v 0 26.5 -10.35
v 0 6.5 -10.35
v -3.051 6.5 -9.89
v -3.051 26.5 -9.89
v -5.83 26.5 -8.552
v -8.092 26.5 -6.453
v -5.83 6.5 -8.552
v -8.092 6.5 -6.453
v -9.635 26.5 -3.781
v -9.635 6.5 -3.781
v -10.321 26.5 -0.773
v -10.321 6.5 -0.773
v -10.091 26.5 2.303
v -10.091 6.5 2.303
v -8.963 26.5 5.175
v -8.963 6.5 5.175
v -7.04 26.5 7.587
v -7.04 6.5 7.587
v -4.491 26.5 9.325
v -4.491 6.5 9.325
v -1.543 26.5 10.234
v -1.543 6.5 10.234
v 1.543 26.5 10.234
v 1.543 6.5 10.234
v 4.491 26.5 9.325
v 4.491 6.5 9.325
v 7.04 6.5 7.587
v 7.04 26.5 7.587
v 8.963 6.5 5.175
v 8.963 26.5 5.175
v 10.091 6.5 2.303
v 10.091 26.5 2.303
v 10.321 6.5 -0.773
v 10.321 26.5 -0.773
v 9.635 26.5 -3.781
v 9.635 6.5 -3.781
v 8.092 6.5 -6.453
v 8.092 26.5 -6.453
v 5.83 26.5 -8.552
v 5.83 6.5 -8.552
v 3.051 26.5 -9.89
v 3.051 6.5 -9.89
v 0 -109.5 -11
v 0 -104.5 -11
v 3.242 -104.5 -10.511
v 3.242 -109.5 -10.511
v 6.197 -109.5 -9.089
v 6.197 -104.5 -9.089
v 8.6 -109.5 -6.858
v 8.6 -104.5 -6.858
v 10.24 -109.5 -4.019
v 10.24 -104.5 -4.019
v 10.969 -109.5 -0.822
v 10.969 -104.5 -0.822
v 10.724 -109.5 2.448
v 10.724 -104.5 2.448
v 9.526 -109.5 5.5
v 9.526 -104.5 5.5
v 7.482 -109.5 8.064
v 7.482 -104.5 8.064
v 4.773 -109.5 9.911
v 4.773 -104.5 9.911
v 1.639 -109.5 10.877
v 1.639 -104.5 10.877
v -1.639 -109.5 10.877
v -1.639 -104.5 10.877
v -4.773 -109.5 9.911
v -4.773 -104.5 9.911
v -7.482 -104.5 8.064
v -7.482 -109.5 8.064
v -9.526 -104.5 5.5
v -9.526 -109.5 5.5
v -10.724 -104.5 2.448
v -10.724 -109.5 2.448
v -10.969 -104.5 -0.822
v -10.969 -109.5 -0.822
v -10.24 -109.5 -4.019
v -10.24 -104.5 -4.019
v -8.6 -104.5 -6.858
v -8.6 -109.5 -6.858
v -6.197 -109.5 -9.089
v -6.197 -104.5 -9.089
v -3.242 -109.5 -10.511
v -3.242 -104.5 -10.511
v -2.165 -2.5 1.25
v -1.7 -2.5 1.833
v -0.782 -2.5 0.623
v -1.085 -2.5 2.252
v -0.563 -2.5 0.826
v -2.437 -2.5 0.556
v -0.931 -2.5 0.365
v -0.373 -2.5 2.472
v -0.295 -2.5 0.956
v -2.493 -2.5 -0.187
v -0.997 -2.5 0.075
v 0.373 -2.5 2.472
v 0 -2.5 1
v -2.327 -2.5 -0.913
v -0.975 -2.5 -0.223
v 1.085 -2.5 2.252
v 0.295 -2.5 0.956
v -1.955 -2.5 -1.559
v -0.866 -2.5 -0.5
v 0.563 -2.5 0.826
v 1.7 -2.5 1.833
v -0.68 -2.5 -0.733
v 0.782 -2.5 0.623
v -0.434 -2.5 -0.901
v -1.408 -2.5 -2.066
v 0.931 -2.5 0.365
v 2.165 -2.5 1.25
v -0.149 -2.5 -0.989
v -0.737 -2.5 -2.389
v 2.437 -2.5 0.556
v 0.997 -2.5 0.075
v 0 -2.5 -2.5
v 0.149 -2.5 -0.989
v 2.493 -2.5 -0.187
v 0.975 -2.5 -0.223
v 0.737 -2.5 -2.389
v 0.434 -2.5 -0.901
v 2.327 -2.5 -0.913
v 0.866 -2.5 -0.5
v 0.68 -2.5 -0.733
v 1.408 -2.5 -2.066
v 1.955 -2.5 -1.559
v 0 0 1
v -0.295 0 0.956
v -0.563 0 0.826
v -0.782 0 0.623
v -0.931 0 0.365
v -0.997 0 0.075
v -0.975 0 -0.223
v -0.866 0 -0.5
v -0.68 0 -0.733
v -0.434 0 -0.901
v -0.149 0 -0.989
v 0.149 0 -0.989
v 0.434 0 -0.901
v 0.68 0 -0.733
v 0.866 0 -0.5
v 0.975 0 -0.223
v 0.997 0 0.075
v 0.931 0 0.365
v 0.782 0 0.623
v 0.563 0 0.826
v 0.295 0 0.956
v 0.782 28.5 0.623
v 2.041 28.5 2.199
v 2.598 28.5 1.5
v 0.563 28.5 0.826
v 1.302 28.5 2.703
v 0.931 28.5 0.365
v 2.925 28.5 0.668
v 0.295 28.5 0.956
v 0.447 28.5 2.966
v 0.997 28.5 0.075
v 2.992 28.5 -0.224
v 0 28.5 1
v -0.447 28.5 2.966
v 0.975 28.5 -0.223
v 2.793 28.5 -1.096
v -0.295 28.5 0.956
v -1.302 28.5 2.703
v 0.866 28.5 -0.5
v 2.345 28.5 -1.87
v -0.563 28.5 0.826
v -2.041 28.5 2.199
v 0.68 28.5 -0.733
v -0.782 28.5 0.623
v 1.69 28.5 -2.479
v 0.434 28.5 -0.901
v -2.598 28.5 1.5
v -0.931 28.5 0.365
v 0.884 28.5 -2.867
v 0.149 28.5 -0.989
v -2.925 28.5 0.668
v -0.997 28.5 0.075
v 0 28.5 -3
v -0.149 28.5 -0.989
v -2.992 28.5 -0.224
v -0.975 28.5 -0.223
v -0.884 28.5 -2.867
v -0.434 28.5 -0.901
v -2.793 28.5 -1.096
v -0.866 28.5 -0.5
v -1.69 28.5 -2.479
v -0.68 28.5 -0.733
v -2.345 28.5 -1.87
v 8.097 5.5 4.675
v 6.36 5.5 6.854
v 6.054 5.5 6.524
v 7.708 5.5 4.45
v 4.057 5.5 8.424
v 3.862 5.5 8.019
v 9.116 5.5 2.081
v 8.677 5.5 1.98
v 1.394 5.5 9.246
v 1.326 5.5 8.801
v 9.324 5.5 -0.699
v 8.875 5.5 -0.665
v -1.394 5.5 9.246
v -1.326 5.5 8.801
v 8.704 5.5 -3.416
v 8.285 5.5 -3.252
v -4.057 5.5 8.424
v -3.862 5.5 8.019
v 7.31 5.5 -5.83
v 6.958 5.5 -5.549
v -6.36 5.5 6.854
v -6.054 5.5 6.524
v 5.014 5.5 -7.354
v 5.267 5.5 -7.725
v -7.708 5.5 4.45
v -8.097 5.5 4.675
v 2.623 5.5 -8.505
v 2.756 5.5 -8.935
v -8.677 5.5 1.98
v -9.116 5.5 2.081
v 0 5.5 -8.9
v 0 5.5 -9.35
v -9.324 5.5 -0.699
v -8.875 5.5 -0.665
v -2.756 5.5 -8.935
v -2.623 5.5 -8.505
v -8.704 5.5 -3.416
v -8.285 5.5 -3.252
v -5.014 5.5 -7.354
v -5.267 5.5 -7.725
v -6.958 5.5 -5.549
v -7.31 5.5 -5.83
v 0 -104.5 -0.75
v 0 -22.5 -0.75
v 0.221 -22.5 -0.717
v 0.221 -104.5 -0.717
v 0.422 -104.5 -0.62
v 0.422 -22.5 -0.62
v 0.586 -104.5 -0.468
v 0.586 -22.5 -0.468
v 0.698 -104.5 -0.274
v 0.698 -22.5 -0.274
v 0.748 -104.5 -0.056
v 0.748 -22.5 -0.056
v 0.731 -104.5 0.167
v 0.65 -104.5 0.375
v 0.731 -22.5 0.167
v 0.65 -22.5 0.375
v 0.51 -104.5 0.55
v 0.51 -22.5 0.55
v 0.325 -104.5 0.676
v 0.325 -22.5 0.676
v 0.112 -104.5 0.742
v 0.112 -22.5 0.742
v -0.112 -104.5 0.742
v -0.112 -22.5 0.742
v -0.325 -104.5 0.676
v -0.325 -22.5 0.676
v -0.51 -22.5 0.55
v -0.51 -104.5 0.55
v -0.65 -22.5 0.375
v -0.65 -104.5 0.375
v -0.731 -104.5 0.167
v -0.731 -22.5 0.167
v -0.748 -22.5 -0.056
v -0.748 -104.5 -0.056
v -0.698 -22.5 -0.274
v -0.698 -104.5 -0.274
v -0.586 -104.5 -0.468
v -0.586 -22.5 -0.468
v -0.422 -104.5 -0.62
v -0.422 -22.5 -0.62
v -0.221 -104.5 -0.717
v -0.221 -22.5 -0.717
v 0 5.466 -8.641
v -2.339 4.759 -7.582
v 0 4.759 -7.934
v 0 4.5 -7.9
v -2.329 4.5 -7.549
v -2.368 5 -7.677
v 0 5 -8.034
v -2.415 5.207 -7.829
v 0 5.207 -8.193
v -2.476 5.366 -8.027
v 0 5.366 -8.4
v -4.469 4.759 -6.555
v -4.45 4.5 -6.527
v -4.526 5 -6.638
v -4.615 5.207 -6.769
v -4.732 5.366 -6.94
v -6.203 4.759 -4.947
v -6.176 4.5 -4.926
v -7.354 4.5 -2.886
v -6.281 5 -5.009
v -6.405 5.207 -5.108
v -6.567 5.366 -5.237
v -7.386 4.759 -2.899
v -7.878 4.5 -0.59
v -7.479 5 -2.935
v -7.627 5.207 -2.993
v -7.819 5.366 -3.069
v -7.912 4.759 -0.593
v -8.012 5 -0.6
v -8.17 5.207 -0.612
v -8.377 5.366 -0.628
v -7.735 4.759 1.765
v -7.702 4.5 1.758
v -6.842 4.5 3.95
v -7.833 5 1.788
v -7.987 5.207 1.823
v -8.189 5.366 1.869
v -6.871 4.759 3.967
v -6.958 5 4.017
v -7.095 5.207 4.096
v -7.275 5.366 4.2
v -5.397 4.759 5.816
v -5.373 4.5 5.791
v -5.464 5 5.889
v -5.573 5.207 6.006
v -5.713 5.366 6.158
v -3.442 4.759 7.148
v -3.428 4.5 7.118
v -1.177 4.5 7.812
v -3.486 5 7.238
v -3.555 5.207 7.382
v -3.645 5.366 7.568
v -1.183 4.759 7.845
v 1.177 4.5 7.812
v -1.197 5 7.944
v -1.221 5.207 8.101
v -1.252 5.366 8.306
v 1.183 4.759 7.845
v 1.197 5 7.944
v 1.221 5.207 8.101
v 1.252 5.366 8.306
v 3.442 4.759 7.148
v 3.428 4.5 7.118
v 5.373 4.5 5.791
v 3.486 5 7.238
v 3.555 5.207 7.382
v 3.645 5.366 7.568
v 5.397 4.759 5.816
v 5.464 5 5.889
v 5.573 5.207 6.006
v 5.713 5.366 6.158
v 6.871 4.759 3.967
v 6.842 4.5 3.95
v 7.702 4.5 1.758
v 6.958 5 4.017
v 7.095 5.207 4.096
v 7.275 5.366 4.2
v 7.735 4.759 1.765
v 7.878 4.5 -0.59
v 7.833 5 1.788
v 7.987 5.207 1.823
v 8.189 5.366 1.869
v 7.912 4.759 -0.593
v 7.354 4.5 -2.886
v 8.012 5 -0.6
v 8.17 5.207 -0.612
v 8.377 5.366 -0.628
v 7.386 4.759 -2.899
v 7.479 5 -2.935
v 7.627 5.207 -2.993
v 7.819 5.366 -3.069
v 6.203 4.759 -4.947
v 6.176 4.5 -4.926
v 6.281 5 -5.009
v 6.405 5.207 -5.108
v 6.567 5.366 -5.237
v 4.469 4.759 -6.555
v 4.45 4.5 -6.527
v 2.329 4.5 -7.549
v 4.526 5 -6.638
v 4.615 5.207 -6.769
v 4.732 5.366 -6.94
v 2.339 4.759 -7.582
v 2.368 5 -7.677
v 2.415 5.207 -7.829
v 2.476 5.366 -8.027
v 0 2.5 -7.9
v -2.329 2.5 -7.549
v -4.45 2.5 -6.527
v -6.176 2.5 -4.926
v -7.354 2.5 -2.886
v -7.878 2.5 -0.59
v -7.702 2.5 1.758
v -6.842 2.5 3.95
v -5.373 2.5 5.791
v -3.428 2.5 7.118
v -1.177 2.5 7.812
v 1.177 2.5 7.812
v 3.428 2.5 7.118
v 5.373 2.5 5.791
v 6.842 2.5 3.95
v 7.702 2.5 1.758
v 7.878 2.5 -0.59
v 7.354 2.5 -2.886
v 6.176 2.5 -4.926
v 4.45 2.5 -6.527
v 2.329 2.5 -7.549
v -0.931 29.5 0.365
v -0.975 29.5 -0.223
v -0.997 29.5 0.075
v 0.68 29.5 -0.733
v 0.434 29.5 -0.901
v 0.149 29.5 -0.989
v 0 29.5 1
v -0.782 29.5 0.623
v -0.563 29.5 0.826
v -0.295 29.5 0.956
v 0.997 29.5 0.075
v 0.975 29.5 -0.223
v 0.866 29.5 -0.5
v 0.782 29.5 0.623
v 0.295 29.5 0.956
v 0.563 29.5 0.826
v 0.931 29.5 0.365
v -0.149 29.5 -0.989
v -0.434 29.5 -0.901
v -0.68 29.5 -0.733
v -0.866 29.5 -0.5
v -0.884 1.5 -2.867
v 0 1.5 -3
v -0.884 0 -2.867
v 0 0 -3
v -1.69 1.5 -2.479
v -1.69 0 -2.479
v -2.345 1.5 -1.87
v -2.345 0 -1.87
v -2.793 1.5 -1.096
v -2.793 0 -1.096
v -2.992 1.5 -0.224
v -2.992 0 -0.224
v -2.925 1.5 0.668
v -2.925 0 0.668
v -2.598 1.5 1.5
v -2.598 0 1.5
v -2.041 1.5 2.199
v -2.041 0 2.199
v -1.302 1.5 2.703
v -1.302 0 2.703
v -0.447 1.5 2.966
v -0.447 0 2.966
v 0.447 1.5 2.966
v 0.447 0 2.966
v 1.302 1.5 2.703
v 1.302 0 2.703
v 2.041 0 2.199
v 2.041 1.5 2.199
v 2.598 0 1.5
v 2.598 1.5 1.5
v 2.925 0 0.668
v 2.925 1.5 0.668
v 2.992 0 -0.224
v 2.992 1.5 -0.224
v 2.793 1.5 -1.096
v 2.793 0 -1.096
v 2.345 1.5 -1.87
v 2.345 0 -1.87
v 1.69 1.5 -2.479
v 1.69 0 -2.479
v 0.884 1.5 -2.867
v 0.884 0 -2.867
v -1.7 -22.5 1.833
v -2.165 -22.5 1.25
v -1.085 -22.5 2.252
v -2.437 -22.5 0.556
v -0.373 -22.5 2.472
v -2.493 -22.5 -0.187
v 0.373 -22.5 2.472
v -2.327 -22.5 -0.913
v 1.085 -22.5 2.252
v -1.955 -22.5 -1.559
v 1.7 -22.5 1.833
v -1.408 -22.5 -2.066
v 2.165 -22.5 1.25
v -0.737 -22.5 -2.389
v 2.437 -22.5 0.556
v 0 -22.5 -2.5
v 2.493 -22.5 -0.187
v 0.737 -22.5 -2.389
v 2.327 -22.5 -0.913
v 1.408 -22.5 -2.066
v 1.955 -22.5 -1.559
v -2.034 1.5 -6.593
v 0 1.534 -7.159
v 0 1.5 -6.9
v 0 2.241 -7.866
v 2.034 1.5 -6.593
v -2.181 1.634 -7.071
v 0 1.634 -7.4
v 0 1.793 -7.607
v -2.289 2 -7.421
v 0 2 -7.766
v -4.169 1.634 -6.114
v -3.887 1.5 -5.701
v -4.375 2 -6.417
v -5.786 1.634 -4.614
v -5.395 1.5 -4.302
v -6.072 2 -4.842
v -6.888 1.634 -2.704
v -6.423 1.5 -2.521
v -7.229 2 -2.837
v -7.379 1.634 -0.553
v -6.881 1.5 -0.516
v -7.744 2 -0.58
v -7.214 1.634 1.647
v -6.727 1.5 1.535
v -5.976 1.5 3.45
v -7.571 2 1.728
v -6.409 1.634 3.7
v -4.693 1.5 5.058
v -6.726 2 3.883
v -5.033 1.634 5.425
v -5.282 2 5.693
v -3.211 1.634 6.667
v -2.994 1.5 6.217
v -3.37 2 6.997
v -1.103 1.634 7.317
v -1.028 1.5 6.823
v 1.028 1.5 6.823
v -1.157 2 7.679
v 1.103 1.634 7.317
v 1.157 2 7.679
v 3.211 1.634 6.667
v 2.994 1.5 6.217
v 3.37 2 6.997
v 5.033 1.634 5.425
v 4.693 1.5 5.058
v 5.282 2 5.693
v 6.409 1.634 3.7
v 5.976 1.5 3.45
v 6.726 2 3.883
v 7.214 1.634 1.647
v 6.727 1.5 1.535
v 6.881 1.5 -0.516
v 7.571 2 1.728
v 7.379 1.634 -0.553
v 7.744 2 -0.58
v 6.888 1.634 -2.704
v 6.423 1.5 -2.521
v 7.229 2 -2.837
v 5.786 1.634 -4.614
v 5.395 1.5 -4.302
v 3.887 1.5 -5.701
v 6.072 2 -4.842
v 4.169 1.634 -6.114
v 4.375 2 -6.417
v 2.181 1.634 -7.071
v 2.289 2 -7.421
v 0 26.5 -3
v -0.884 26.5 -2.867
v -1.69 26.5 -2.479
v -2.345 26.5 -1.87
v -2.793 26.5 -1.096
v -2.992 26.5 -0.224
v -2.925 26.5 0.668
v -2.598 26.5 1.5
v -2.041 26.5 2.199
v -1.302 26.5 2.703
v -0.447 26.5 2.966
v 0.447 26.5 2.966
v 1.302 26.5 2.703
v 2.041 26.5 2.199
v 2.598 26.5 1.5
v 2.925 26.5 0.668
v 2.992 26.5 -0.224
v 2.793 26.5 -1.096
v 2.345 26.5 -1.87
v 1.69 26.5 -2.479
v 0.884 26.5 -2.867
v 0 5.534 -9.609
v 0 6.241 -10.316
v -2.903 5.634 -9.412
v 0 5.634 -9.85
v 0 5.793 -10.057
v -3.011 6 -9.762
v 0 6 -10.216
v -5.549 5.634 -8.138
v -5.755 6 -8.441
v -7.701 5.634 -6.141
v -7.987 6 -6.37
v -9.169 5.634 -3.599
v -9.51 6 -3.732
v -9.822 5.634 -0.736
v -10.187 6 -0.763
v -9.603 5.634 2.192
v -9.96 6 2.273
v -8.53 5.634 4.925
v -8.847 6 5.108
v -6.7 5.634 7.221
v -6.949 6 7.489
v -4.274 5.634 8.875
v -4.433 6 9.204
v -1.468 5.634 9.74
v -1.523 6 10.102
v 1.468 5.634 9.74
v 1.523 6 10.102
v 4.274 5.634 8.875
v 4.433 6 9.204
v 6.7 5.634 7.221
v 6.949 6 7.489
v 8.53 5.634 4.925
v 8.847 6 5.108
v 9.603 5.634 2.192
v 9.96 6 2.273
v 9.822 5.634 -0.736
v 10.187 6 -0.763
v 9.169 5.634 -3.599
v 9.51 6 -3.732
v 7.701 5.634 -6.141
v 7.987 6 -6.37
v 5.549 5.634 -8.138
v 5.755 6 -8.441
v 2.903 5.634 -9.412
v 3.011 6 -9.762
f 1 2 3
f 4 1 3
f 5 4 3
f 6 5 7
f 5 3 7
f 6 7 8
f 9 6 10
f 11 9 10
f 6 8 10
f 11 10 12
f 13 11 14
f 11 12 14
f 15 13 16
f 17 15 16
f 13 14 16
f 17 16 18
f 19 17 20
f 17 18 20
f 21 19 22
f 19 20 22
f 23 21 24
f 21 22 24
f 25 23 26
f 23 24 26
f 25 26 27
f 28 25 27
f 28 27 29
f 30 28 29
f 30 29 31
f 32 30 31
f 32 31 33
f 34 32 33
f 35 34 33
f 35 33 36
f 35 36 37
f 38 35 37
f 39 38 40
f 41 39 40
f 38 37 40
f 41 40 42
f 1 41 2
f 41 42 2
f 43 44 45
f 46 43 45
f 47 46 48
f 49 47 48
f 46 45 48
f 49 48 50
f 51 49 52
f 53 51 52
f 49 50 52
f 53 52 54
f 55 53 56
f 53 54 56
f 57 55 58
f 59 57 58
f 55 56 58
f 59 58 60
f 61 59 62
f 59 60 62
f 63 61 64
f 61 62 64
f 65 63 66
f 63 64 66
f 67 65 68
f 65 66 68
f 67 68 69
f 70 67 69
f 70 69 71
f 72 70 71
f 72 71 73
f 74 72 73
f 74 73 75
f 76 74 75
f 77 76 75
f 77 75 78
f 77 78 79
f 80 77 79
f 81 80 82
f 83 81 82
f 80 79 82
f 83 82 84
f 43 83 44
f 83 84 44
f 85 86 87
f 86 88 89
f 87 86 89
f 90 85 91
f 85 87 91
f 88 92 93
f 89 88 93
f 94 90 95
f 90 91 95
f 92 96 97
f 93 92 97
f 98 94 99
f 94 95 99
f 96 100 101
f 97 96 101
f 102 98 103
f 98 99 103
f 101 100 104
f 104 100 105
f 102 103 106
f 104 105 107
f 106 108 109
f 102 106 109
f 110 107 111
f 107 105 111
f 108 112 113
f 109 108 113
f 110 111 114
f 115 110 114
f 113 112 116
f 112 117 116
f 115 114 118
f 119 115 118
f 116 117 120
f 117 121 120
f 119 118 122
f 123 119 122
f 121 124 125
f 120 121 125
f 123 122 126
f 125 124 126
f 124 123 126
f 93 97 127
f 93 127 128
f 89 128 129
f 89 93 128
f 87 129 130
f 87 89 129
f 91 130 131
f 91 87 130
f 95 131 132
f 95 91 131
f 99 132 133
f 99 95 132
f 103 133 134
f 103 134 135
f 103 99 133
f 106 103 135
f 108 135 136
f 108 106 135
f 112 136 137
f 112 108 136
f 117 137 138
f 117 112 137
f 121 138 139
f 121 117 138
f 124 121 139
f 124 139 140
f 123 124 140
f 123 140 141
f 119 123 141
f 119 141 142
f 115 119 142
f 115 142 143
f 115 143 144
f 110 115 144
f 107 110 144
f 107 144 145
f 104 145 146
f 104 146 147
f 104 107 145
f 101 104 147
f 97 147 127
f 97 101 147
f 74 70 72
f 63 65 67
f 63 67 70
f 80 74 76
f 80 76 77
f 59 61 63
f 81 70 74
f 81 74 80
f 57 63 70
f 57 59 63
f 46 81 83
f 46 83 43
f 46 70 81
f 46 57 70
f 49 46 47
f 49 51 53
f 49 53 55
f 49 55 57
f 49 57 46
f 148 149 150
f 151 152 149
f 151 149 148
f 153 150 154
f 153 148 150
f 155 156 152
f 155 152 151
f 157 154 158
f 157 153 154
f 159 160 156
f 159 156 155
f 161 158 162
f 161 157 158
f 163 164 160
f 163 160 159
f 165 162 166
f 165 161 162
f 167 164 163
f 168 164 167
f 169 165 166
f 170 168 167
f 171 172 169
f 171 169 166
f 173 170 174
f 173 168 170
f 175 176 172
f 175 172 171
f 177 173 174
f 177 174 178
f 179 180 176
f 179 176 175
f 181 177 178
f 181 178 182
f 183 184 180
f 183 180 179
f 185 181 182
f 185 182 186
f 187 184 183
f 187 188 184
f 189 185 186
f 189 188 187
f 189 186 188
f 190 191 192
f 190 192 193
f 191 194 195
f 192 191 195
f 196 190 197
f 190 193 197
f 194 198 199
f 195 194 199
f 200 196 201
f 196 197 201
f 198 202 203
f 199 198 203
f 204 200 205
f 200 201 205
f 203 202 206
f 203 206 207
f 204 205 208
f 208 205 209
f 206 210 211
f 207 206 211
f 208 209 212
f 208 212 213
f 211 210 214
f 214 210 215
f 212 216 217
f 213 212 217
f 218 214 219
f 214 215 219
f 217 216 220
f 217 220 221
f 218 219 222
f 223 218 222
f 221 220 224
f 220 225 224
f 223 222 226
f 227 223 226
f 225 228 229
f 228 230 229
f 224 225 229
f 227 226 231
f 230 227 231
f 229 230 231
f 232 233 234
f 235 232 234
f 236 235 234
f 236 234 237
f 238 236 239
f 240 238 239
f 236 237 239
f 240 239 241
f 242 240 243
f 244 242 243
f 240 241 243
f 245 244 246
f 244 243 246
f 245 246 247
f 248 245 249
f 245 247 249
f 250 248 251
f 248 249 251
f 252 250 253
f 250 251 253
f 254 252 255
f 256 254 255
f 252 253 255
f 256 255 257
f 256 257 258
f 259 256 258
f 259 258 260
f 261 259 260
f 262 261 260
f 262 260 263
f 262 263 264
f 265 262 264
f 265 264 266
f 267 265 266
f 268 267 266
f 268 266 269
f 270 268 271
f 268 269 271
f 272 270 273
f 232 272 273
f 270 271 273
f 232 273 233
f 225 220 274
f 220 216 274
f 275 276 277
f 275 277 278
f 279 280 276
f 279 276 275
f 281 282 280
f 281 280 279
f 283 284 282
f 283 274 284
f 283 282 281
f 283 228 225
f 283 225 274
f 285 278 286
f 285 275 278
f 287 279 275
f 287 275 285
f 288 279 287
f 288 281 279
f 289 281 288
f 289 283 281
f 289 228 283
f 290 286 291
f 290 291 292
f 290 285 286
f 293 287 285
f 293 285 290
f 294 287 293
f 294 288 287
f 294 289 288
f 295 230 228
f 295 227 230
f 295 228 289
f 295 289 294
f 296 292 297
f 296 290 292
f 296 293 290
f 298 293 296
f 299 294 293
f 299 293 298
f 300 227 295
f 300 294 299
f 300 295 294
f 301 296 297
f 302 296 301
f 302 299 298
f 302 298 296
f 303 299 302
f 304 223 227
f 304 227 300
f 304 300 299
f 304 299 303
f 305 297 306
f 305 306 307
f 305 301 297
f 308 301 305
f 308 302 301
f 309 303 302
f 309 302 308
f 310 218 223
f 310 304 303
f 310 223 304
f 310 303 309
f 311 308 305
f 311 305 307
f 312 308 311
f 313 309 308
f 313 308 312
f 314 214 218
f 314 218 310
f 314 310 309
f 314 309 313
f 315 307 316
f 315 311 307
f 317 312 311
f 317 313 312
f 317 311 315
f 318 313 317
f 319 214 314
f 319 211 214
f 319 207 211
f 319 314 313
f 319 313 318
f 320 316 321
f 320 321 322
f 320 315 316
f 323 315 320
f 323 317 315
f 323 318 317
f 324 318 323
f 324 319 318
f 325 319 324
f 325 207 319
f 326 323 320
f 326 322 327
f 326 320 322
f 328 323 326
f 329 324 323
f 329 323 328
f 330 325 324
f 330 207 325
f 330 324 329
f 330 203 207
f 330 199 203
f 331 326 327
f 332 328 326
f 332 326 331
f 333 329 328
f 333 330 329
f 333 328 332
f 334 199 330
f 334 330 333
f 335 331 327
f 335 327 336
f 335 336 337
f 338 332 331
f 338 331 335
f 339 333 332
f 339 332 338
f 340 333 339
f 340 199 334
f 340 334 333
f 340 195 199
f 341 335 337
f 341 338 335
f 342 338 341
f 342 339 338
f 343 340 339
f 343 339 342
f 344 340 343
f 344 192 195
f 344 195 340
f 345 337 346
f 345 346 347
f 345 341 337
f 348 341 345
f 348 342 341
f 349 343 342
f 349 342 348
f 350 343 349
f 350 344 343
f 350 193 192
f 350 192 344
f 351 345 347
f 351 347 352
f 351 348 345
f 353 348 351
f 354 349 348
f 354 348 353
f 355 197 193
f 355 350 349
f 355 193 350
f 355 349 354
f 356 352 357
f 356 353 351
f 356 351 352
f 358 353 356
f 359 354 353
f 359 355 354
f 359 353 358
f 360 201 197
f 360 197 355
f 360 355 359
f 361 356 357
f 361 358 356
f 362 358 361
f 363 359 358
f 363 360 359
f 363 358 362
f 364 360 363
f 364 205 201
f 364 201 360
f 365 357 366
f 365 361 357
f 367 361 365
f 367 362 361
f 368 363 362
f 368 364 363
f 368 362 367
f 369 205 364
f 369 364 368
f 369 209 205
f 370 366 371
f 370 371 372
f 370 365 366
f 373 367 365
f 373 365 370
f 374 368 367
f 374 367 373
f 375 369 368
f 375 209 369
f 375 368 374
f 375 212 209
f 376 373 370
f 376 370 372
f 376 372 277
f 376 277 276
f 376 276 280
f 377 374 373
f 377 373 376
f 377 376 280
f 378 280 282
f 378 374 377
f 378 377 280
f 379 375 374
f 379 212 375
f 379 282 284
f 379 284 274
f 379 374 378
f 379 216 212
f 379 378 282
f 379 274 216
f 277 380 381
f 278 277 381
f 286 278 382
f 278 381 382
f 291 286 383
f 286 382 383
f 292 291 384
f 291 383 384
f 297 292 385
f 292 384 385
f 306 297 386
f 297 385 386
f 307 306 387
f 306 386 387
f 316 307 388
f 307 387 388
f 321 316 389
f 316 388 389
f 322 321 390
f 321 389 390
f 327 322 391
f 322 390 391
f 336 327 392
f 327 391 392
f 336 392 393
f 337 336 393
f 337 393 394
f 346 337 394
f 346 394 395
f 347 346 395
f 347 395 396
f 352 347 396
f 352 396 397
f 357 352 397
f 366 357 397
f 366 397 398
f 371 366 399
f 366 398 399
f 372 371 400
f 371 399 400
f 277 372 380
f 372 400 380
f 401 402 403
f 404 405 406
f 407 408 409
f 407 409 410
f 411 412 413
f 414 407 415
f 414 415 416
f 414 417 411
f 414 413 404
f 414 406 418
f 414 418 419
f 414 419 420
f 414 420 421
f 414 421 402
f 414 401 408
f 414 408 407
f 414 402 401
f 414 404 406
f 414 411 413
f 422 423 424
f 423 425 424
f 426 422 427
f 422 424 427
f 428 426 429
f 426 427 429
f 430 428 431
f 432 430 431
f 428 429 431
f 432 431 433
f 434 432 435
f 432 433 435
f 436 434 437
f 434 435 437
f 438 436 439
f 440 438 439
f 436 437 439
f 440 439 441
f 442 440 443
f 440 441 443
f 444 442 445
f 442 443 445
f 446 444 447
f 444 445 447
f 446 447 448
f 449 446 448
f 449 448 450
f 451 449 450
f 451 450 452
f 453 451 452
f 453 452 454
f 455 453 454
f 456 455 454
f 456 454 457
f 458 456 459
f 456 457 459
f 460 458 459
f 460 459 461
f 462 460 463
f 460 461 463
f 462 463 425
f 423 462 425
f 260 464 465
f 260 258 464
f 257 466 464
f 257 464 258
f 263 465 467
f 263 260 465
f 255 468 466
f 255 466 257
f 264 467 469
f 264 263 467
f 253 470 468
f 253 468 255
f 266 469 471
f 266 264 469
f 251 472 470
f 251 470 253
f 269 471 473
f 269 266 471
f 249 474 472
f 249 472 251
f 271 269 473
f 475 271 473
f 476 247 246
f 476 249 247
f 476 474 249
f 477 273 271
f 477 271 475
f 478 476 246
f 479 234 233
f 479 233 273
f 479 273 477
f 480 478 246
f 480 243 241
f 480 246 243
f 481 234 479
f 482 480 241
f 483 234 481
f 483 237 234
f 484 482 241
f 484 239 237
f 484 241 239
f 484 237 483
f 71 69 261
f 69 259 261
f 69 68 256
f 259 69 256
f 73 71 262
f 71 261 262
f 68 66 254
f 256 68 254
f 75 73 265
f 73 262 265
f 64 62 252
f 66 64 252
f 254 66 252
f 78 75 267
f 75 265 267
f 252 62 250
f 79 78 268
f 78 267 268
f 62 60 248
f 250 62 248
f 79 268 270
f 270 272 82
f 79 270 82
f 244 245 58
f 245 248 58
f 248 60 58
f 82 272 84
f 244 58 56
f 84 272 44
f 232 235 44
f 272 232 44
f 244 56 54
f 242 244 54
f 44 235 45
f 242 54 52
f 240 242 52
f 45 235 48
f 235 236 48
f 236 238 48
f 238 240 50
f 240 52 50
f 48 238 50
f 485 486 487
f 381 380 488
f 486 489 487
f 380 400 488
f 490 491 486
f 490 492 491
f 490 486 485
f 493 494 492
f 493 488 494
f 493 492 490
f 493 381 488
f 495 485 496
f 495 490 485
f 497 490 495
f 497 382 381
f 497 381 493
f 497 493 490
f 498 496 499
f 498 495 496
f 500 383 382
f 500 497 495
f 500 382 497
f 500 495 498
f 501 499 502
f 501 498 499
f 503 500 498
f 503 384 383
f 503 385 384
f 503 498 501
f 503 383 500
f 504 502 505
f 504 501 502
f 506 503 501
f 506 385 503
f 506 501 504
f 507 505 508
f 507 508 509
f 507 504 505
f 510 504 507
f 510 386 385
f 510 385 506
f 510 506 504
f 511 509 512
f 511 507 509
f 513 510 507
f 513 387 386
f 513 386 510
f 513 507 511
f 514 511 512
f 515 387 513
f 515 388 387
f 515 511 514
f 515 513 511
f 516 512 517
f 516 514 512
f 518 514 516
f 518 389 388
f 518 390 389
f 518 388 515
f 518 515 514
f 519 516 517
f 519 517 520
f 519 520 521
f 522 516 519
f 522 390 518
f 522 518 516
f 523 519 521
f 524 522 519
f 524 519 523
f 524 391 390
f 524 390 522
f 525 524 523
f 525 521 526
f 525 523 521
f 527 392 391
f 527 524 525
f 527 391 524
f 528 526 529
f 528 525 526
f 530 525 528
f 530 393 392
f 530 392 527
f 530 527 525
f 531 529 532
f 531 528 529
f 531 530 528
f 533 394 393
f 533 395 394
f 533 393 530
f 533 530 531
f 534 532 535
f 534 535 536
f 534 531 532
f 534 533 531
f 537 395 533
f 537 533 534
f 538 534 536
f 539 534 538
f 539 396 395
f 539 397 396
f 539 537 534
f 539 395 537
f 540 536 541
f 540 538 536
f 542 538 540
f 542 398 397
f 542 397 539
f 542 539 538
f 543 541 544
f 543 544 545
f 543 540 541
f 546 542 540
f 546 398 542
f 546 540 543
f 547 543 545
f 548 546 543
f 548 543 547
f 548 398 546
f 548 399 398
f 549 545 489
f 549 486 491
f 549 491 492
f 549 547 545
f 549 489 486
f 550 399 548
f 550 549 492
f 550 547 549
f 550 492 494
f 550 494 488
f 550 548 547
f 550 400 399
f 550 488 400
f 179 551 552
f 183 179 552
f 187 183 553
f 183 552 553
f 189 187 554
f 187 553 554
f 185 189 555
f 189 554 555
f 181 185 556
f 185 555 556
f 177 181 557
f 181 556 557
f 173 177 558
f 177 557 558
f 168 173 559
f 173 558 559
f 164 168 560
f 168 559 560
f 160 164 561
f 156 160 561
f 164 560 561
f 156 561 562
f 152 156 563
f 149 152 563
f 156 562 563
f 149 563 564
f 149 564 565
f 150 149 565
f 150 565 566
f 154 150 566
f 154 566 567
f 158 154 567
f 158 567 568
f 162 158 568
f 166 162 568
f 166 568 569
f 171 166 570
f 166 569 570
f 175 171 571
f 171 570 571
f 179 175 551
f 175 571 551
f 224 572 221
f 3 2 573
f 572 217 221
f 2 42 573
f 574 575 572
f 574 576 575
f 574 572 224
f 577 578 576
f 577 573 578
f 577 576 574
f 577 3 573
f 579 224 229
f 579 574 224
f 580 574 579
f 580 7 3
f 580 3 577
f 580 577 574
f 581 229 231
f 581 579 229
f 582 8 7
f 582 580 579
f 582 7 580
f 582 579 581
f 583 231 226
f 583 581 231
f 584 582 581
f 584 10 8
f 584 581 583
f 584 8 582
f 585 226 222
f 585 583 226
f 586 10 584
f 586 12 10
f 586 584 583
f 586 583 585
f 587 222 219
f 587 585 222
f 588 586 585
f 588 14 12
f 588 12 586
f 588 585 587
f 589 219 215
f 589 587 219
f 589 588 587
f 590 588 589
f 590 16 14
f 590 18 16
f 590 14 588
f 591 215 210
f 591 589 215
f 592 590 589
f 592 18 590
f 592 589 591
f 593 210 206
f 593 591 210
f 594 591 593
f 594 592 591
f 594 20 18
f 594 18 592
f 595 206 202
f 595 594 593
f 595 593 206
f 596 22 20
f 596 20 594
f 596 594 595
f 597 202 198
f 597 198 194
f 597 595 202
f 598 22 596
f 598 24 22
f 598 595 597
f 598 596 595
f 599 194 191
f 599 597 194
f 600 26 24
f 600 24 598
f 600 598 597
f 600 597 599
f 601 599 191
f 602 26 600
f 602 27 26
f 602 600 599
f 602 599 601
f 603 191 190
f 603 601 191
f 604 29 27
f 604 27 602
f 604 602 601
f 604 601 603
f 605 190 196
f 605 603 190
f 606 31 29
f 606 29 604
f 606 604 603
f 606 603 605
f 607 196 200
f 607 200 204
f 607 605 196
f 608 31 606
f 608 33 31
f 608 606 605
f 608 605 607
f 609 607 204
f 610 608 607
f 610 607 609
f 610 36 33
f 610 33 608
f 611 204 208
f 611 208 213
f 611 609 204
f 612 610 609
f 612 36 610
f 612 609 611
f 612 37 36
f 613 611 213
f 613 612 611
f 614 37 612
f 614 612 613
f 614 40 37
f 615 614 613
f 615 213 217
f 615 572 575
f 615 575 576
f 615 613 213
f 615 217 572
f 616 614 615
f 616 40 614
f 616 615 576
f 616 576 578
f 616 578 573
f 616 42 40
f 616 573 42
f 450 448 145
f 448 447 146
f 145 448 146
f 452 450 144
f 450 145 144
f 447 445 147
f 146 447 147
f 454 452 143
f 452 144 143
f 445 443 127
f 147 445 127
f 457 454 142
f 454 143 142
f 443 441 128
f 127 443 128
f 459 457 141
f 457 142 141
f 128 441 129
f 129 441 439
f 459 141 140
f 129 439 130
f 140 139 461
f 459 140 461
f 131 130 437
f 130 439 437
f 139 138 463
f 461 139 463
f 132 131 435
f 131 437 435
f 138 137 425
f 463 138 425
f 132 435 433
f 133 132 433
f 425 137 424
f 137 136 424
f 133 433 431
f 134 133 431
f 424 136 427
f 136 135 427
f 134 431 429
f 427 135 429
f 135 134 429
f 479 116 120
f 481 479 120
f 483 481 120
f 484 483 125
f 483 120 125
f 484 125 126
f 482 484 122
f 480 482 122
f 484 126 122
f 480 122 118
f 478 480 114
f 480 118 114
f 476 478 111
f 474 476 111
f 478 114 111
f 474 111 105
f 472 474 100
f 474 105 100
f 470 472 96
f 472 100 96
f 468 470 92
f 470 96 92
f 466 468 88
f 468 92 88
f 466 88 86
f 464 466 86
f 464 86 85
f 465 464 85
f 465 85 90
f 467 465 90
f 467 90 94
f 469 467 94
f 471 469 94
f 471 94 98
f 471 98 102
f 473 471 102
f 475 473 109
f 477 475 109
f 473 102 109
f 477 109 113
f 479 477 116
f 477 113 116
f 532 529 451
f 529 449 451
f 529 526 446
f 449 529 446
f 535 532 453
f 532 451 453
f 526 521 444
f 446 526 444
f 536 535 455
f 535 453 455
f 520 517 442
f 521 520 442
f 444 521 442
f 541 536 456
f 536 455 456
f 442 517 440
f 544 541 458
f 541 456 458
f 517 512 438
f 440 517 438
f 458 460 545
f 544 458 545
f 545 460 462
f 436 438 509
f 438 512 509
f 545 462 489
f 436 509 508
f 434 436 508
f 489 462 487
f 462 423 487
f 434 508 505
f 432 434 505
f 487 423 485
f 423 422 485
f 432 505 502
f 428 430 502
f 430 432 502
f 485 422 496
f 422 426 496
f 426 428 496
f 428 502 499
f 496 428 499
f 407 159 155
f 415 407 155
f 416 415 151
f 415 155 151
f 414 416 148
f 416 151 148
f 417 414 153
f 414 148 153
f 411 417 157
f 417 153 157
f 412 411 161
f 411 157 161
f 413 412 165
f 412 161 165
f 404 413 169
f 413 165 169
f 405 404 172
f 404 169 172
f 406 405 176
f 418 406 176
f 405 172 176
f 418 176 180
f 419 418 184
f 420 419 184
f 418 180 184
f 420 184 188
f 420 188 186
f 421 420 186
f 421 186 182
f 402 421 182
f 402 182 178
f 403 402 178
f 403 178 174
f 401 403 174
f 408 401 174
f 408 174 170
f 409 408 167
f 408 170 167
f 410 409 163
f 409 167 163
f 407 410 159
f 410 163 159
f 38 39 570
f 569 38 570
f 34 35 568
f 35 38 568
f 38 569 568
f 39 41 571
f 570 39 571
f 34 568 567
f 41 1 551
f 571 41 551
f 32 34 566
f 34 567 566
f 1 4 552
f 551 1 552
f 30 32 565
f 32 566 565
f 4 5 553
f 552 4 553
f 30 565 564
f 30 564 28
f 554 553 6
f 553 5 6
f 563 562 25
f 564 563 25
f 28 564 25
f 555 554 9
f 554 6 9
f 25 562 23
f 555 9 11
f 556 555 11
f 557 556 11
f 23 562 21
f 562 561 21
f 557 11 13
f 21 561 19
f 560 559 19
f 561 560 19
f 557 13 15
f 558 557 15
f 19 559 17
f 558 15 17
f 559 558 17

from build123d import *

# Parameters (mm, degrees)
CROQUIS2_R              = 3
SALIENTE_EXTRUIR1_DEPTH = 2
CROQUIS3_R              = 1
SALIENTE_EXTRUIR2_DEPTH = 1
SALIENTE_EXTRUIR3_START = 2.5
CROQUIS4_R              = 1
SALIENTE_EXTRUIR3_DEPTH = 2.5
CROQUIS5_R              = 2.5
SALIENTE_EXTRUIR4_DEPTH = 20
CROQUIS6_R              = 0.75
SALIENTE_EXTRUIR5_DEPTH = 82
CROQUIS7_R              = 11
SALIENTE_EXTRUIR6_DEPTH = 5
REDONDEO1_R             = 1


with BuildPart() as part:
    # Croquis1 → Revolución1 (revolve)
    with BuildSketch(Plane.XY, mode=Mode.PRIVATE) as revoluci_n1_sk:
        Polygon((0, 0), (0, 26.5), (10.35, 26.5), (10.35, 5.5), (7.9, 5.5), (7.9, 1.5), (3, 1.5), (3, 0), align=None)
    revolve(revoluci_n1_sk.sketch.rotate(Axis((0, 14.951468567, 0), (0, 1, 0)), 90), axis=Axis((0, 14.951468567, 0), (0, 1, 0)))

    # Croquis2 → Saliente-Extruir1 (add)
    with BuildSketch(Plane(origin=(0, 26.5, 0), x_dir=(1, 0, 0), z_dir=(0, 1, 0))):
        with Locations(Location((0, 0, 0), (0, 0, 90))):
            Circle(CROQUIS2_R)
    extrude(amount=SALIENTE_EXTRUIR1_DEPTH)

    # Croquis3 → Saliente-Extruir2 (add)
    with BuildSketch(Plane(origin=(0, 28.5, 0), x_dir=(1, 0, 0), z_dir=(0, 1, 0))):
        with Locations(Location((0, 0, 0), (0, 0, 270))):
            Circle(CROQUIS3_R)
    extrude(amount=SALIENTE_EXTRUIR2_DEPTH)

    # Croquis4 → Saliente-Extruir3 (add)
    with BuildSketch(Plane.XZ.offset(SALIENTE_EXTRUIR3_START)):
        with Locations(Location((0, 0, 0), (0, 0, 90))):
            Circle(CROQUIS4_R)
    extrude(amount=-SALIENTE_EXTRUIR3_DEPTH)

    # Croquis5 → Saliente-Extruir4 (add)
    with BuildSketch(Plane.XZ.offset(2.5)):
        with Locations(Location((0, 0, 0), (0, 0, 270))):
            Circle(CROQUIS5_R)
    extrude(amount=SALIENTE_EXTRUIR4_DEPTH)

    # Croquis6 → Saliente-Extruir5 (add)
    with BuildSketch(Plane.XZ.offset(22.5)):
        with Locations(Location((0, 0, 0), (0, 0, 270))):
            Circle(CROQUIS6_R)
    extrude(amount=SALIENTE_EXTRUIR5_DEPTH)

    # Croquis7 → Saliente-Extruir6 (add)
    with BuildSketch(Plane.XZ.offset(104.5)):
        with Locations(Location((0, 0, 0), (0, 0, 270))):
            Circle(CROQUIS7_R)
    extrude(amount=SALIENTE_EXTRUIR6_DEPTH)

    # Redondeo1
    redondeo1_edges = [part.edges().sort_by_distance(p)[0] for p in [
        (0, 1.5, 7.9),
        (0, 5.5, 7.9),
        (0, 5.5, 10.35),
    ]]
    fillet(redondeo1_edges, radius=REDONDEO1_R)


solid = part.part
